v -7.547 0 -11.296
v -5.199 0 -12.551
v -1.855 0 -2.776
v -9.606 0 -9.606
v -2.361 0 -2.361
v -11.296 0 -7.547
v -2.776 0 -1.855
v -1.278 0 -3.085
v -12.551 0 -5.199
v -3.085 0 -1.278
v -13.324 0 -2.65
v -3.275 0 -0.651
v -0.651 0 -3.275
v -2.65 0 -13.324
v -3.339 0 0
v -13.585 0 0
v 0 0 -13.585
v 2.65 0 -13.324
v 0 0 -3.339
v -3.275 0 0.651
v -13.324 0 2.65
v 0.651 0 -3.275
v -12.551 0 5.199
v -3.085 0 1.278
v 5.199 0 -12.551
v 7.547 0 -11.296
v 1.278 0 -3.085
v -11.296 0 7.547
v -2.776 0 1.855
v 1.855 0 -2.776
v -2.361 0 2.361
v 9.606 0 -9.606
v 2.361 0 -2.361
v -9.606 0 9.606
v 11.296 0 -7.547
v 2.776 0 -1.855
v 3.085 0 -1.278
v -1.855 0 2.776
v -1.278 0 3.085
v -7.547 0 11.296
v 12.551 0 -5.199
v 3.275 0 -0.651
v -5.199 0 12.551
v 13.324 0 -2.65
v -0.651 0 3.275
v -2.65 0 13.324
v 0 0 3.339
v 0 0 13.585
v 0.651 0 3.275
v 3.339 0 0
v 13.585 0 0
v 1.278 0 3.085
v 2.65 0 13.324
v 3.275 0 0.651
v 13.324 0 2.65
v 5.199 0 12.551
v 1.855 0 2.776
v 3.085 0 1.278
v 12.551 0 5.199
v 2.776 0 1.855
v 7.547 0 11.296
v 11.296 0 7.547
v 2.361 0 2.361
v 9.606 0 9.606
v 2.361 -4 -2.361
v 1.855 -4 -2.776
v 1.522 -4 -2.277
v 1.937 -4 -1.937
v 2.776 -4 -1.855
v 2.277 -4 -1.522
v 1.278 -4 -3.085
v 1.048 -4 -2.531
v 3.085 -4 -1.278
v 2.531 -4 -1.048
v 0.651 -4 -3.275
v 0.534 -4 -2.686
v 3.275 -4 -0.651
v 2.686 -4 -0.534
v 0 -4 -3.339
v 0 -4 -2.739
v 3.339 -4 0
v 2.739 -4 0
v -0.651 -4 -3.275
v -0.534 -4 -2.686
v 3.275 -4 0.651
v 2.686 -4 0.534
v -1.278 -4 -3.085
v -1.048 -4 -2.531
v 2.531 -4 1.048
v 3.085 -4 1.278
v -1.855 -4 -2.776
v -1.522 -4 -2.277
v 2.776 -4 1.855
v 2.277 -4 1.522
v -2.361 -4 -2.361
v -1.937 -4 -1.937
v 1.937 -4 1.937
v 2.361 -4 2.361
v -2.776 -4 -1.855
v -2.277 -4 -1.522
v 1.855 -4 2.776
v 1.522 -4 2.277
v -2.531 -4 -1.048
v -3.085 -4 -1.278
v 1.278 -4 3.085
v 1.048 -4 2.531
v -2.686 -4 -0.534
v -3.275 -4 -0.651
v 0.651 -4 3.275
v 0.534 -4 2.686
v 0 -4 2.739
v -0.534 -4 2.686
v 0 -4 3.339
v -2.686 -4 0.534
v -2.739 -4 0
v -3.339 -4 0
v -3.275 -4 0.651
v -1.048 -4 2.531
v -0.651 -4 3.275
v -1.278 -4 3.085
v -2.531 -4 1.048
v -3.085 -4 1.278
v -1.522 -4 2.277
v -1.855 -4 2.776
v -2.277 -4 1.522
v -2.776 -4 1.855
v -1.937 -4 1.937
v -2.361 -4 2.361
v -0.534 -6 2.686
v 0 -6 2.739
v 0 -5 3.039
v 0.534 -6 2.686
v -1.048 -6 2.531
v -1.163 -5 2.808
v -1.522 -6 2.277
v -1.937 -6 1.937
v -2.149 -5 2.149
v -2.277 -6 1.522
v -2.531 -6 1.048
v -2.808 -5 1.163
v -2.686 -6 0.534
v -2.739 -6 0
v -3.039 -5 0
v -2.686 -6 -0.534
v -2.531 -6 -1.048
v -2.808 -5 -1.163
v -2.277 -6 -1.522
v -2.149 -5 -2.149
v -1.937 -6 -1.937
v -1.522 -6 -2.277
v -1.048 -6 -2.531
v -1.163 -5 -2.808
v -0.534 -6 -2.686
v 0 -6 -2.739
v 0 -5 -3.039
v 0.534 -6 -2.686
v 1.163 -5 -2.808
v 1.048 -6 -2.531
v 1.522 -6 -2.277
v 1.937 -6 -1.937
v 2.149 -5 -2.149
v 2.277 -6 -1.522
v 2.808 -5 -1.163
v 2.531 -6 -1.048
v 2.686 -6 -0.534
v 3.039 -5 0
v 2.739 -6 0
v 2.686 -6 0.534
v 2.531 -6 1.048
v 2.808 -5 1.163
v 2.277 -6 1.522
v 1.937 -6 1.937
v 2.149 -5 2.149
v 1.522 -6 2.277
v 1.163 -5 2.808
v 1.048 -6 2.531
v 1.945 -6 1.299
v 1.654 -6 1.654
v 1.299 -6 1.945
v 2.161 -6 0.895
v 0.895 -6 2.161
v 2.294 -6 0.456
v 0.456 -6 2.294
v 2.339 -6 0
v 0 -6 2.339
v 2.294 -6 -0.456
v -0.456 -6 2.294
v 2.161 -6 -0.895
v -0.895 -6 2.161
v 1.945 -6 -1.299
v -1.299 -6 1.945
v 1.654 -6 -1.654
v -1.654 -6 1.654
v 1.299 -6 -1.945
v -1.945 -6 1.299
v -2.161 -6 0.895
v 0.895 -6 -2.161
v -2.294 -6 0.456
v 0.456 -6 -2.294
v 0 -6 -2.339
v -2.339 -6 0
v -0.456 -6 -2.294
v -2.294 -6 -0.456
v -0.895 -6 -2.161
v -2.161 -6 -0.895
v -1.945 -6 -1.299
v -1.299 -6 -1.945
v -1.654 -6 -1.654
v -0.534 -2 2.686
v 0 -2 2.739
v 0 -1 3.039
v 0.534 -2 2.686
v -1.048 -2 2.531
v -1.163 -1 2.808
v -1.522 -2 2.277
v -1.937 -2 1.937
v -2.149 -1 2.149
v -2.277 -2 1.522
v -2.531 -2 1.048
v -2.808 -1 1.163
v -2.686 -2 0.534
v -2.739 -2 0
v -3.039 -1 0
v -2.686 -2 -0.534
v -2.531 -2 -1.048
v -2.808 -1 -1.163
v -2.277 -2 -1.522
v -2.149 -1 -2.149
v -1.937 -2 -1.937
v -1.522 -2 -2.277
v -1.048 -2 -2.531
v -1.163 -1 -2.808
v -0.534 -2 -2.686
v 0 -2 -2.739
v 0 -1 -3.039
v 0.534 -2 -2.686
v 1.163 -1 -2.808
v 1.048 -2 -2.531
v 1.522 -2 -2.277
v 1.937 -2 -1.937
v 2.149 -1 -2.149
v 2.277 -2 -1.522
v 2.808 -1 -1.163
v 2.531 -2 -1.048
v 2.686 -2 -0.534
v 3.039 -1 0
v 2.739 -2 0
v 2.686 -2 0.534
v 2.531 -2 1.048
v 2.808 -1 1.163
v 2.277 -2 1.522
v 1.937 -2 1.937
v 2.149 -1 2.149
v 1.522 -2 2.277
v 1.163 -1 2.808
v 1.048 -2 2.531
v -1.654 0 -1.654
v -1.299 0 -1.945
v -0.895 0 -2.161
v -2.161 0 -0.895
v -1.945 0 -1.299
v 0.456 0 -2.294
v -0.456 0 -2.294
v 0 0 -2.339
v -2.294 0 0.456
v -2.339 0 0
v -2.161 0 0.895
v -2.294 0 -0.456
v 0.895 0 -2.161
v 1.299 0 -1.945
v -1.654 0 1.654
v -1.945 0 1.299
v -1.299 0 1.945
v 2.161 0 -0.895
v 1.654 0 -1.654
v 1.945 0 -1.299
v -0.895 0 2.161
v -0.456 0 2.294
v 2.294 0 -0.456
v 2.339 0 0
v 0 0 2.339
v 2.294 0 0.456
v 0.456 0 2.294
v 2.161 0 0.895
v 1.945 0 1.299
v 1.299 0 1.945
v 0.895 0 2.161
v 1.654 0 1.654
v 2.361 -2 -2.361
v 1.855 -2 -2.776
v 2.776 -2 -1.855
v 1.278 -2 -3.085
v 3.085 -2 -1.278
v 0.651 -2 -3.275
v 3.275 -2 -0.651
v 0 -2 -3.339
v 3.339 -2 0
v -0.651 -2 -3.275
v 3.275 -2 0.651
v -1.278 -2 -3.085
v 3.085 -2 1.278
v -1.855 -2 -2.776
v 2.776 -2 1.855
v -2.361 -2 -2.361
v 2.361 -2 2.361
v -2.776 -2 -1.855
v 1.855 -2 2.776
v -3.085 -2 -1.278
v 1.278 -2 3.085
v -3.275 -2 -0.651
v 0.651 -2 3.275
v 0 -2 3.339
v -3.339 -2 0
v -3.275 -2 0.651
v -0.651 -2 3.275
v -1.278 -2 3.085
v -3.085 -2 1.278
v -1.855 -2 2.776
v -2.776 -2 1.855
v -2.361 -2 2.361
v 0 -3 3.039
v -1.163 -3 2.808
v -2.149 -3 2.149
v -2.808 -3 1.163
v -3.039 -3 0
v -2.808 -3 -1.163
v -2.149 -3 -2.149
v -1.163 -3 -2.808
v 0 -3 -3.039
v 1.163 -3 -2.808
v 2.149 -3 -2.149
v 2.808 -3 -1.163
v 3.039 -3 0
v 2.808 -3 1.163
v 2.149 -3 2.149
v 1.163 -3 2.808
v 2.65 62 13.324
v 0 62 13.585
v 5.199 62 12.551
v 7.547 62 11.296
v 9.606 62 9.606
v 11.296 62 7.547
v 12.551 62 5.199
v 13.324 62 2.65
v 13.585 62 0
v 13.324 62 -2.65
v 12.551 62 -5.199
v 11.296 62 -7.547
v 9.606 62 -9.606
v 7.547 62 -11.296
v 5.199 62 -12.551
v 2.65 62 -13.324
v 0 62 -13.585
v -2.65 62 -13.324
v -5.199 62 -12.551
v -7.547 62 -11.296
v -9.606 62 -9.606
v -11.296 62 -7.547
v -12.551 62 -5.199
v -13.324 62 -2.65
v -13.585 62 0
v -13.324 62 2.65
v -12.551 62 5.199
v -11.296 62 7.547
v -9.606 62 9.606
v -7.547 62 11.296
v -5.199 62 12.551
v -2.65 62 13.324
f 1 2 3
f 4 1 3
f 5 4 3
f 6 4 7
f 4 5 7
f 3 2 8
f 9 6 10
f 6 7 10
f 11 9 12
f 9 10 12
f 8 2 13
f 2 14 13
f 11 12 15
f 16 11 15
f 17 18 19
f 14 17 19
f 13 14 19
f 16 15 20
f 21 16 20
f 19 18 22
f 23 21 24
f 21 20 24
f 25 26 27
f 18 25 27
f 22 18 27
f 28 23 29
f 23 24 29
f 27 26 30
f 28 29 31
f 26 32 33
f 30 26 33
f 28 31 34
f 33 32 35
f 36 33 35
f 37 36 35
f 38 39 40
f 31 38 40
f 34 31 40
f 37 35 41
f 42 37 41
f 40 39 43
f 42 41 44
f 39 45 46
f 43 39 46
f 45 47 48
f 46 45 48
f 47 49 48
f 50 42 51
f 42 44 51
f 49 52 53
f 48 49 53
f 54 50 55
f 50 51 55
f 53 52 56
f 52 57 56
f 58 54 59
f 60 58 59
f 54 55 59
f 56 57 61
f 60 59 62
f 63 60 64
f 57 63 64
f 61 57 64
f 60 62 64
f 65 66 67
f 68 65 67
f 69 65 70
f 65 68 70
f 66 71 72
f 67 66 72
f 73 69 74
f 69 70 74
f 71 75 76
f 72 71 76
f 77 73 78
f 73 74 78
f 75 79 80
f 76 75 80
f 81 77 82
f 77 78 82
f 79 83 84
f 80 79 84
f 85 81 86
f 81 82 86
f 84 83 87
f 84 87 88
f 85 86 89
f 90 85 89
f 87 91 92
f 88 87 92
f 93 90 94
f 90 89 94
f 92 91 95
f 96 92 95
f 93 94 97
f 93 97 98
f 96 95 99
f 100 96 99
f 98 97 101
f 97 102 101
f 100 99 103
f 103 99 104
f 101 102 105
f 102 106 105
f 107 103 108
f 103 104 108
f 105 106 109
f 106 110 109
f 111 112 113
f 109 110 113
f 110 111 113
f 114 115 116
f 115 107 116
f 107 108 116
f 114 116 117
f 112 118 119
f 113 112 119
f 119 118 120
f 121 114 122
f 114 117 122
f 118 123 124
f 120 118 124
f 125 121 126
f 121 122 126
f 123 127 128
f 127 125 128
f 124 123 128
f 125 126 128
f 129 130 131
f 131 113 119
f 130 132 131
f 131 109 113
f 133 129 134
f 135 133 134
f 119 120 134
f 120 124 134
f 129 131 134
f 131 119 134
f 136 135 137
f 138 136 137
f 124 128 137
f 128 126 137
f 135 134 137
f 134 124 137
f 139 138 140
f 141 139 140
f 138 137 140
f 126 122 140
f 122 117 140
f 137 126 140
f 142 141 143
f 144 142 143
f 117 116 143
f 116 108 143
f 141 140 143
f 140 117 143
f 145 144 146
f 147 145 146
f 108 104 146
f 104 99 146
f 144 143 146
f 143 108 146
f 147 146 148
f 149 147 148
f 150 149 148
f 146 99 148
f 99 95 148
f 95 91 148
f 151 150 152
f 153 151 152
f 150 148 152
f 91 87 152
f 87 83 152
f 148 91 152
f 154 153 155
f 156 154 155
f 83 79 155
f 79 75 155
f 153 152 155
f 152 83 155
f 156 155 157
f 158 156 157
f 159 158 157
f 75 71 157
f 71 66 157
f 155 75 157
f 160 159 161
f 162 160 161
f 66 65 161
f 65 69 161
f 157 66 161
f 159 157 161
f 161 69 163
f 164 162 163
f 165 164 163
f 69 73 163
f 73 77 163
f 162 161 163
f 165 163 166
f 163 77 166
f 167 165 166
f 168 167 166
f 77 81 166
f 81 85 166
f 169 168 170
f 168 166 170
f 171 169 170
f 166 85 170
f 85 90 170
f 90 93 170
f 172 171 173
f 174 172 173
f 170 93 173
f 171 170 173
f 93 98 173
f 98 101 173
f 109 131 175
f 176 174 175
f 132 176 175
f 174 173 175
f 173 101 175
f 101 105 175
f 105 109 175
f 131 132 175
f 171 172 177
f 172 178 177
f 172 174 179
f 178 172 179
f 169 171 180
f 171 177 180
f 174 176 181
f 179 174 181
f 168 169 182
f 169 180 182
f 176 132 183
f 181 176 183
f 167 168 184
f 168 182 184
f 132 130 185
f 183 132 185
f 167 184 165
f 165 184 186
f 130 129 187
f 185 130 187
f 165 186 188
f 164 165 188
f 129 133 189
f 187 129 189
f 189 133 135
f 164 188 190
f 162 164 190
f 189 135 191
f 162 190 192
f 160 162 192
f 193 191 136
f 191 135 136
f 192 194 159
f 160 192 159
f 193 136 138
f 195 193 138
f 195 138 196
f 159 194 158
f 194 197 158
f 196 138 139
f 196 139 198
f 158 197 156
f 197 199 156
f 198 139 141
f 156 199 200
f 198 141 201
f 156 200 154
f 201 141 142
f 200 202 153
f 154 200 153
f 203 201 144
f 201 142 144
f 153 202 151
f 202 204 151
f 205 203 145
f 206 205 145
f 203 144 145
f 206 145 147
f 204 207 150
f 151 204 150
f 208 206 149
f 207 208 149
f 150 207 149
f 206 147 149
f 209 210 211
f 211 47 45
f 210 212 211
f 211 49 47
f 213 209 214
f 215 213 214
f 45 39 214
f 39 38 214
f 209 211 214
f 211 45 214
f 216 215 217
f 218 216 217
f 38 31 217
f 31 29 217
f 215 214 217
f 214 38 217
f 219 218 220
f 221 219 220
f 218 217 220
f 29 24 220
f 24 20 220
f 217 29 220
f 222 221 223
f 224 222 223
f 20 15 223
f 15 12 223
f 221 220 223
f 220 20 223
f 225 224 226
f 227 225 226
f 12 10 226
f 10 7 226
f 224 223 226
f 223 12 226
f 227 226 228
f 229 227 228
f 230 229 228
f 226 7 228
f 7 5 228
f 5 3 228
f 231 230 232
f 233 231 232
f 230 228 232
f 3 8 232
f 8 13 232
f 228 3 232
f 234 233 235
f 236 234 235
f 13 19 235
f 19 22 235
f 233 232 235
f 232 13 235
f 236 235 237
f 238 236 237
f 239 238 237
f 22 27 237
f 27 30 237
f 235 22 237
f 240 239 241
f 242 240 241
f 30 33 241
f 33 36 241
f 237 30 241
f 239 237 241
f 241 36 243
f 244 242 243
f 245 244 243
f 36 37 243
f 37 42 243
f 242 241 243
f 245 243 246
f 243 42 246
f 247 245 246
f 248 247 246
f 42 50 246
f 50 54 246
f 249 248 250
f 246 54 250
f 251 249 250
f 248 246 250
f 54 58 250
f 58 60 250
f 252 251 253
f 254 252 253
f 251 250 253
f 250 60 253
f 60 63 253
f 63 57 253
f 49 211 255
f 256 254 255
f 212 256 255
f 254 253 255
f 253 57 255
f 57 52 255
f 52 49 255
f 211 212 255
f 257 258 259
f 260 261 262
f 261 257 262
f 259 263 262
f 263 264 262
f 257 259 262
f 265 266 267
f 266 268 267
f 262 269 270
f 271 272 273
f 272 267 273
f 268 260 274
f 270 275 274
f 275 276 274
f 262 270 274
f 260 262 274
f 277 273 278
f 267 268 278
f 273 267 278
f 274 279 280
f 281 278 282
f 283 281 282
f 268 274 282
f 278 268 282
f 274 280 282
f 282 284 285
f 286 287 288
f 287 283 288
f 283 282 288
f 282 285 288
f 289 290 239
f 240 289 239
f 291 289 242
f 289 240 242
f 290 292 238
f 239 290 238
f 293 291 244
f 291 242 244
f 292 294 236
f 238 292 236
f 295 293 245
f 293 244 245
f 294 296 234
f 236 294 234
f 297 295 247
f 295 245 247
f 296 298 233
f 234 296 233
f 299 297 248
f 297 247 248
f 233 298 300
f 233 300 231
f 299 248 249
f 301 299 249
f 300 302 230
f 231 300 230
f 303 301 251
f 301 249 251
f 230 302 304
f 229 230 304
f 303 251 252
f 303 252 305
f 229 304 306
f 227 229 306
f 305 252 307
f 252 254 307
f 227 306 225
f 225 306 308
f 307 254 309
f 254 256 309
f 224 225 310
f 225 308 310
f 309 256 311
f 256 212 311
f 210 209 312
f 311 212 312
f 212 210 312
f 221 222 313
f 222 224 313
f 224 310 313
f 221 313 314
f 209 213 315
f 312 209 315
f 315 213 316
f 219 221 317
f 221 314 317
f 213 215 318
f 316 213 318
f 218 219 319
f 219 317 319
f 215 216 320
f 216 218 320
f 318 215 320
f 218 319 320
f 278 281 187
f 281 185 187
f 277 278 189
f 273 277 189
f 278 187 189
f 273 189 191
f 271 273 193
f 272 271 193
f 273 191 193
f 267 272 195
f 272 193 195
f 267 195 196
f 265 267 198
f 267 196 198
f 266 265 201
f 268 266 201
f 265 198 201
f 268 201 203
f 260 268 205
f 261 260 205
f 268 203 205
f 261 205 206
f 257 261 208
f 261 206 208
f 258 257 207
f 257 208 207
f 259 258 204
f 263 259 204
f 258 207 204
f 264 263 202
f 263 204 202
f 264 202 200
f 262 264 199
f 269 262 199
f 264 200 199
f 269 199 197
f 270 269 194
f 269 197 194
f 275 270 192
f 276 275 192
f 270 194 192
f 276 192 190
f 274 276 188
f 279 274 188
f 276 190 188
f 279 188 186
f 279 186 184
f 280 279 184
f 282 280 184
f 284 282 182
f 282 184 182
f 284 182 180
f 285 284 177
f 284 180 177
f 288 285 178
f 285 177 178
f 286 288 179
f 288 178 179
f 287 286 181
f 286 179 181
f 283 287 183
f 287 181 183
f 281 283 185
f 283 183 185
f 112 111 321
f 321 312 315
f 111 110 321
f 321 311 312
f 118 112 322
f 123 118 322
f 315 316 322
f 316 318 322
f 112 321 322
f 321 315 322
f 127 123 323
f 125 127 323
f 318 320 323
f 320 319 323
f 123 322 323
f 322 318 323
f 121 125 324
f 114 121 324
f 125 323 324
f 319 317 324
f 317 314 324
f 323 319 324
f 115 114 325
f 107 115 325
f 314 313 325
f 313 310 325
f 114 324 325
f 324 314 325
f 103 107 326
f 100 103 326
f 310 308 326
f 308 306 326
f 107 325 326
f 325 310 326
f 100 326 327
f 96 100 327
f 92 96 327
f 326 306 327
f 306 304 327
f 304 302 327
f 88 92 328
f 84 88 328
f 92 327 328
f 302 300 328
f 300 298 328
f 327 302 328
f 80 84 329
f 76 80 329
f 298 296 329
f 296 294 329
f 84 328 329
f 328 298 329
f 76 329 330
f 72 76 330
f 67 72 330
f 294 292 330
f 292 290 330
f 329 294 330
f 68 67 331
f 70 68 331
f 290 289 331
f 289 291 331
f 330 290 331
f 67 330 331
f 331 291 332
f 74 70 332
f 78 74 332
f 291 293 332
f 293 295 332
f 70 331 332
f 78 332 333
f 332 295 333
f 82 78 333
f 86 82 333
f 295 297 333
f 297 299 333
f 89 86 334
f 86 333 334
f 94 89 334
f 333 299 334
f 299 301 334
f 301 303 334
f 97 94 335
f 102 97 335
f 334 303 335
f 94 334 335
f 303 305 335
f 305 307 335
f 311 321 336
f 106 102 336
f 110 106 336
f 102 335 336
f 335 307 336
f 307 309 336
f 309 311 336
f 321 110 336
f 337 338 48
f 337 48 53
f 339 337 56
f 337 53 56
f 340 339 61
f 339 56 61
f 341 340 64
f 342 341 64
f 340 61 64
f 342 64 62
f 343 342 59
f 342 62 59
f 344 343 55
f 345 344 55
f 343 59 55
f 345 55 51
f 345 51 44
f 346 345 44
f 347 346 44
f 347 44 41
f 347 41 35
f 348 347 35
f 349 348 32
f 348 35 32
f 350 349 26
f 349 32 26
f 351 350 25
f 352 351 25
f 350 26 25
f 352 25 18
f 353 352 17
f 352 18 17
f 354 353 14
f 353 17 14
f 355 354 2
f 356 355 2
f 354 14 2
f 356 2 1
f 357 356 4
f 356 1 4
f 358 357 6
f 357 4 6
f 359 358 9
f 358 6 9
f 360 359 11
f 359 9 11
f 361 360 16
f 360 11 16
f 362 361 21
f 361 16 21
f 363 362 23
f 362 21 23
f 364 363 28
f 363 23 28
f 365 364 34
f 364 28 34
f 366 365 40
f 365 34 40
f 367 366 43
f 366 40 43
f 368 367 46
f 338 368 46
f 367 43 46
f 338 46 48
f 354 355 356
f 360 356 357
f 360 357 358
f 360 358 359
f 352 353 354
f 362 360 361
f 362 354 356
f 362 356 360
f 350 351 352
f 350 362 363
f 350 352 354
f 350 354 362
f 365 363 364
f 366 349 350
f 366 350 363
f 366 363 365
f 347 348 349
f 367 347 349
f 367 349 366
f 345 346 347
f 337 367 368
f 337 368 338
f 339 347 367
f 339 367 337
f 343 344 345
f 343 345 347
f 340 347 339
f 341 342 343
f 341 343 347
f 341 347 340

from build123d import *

# Parameters (mm, degrees)
SKETCH_1_R      = 13.585
EXTRUDE_1_DEPTH = 62


with BuildPart() as part:
    # 草图1 → 凸台-拉伸1 (new body)
    with BuildSketch(Plane(origin=(0, 0, 0), x_dir=(1, 0, 0), z_dir=(0, 1, 0))):
        with Locations(Location((0, 0, 0), (0, 0, 270))):
            Circle(SKETCH_1_R)
    extrude(amount=EXTRUDE_1_DEPTH)

    # 草图2 → 旋转1 (revolve)
    with BuildSketch(Plane.XY, mode=Mode.PRIVATE) as revolve_1_sk:
        Polygon((2.339013215, -6), (2.739013215, -6), (3.339013215, -4), (2.739013215, -4), (3.339013215, -2), (2.739013215, -2), (3.339013215, 0), (2.339013215, 0), align=None)
    revolve(revolve_1_sk.sketch.rotate(Axis((0, 0, 0), (0, -1, 0)), 90), axis=Axis((0, 0, 0), (0, -1, 0)))


solid = part.part
